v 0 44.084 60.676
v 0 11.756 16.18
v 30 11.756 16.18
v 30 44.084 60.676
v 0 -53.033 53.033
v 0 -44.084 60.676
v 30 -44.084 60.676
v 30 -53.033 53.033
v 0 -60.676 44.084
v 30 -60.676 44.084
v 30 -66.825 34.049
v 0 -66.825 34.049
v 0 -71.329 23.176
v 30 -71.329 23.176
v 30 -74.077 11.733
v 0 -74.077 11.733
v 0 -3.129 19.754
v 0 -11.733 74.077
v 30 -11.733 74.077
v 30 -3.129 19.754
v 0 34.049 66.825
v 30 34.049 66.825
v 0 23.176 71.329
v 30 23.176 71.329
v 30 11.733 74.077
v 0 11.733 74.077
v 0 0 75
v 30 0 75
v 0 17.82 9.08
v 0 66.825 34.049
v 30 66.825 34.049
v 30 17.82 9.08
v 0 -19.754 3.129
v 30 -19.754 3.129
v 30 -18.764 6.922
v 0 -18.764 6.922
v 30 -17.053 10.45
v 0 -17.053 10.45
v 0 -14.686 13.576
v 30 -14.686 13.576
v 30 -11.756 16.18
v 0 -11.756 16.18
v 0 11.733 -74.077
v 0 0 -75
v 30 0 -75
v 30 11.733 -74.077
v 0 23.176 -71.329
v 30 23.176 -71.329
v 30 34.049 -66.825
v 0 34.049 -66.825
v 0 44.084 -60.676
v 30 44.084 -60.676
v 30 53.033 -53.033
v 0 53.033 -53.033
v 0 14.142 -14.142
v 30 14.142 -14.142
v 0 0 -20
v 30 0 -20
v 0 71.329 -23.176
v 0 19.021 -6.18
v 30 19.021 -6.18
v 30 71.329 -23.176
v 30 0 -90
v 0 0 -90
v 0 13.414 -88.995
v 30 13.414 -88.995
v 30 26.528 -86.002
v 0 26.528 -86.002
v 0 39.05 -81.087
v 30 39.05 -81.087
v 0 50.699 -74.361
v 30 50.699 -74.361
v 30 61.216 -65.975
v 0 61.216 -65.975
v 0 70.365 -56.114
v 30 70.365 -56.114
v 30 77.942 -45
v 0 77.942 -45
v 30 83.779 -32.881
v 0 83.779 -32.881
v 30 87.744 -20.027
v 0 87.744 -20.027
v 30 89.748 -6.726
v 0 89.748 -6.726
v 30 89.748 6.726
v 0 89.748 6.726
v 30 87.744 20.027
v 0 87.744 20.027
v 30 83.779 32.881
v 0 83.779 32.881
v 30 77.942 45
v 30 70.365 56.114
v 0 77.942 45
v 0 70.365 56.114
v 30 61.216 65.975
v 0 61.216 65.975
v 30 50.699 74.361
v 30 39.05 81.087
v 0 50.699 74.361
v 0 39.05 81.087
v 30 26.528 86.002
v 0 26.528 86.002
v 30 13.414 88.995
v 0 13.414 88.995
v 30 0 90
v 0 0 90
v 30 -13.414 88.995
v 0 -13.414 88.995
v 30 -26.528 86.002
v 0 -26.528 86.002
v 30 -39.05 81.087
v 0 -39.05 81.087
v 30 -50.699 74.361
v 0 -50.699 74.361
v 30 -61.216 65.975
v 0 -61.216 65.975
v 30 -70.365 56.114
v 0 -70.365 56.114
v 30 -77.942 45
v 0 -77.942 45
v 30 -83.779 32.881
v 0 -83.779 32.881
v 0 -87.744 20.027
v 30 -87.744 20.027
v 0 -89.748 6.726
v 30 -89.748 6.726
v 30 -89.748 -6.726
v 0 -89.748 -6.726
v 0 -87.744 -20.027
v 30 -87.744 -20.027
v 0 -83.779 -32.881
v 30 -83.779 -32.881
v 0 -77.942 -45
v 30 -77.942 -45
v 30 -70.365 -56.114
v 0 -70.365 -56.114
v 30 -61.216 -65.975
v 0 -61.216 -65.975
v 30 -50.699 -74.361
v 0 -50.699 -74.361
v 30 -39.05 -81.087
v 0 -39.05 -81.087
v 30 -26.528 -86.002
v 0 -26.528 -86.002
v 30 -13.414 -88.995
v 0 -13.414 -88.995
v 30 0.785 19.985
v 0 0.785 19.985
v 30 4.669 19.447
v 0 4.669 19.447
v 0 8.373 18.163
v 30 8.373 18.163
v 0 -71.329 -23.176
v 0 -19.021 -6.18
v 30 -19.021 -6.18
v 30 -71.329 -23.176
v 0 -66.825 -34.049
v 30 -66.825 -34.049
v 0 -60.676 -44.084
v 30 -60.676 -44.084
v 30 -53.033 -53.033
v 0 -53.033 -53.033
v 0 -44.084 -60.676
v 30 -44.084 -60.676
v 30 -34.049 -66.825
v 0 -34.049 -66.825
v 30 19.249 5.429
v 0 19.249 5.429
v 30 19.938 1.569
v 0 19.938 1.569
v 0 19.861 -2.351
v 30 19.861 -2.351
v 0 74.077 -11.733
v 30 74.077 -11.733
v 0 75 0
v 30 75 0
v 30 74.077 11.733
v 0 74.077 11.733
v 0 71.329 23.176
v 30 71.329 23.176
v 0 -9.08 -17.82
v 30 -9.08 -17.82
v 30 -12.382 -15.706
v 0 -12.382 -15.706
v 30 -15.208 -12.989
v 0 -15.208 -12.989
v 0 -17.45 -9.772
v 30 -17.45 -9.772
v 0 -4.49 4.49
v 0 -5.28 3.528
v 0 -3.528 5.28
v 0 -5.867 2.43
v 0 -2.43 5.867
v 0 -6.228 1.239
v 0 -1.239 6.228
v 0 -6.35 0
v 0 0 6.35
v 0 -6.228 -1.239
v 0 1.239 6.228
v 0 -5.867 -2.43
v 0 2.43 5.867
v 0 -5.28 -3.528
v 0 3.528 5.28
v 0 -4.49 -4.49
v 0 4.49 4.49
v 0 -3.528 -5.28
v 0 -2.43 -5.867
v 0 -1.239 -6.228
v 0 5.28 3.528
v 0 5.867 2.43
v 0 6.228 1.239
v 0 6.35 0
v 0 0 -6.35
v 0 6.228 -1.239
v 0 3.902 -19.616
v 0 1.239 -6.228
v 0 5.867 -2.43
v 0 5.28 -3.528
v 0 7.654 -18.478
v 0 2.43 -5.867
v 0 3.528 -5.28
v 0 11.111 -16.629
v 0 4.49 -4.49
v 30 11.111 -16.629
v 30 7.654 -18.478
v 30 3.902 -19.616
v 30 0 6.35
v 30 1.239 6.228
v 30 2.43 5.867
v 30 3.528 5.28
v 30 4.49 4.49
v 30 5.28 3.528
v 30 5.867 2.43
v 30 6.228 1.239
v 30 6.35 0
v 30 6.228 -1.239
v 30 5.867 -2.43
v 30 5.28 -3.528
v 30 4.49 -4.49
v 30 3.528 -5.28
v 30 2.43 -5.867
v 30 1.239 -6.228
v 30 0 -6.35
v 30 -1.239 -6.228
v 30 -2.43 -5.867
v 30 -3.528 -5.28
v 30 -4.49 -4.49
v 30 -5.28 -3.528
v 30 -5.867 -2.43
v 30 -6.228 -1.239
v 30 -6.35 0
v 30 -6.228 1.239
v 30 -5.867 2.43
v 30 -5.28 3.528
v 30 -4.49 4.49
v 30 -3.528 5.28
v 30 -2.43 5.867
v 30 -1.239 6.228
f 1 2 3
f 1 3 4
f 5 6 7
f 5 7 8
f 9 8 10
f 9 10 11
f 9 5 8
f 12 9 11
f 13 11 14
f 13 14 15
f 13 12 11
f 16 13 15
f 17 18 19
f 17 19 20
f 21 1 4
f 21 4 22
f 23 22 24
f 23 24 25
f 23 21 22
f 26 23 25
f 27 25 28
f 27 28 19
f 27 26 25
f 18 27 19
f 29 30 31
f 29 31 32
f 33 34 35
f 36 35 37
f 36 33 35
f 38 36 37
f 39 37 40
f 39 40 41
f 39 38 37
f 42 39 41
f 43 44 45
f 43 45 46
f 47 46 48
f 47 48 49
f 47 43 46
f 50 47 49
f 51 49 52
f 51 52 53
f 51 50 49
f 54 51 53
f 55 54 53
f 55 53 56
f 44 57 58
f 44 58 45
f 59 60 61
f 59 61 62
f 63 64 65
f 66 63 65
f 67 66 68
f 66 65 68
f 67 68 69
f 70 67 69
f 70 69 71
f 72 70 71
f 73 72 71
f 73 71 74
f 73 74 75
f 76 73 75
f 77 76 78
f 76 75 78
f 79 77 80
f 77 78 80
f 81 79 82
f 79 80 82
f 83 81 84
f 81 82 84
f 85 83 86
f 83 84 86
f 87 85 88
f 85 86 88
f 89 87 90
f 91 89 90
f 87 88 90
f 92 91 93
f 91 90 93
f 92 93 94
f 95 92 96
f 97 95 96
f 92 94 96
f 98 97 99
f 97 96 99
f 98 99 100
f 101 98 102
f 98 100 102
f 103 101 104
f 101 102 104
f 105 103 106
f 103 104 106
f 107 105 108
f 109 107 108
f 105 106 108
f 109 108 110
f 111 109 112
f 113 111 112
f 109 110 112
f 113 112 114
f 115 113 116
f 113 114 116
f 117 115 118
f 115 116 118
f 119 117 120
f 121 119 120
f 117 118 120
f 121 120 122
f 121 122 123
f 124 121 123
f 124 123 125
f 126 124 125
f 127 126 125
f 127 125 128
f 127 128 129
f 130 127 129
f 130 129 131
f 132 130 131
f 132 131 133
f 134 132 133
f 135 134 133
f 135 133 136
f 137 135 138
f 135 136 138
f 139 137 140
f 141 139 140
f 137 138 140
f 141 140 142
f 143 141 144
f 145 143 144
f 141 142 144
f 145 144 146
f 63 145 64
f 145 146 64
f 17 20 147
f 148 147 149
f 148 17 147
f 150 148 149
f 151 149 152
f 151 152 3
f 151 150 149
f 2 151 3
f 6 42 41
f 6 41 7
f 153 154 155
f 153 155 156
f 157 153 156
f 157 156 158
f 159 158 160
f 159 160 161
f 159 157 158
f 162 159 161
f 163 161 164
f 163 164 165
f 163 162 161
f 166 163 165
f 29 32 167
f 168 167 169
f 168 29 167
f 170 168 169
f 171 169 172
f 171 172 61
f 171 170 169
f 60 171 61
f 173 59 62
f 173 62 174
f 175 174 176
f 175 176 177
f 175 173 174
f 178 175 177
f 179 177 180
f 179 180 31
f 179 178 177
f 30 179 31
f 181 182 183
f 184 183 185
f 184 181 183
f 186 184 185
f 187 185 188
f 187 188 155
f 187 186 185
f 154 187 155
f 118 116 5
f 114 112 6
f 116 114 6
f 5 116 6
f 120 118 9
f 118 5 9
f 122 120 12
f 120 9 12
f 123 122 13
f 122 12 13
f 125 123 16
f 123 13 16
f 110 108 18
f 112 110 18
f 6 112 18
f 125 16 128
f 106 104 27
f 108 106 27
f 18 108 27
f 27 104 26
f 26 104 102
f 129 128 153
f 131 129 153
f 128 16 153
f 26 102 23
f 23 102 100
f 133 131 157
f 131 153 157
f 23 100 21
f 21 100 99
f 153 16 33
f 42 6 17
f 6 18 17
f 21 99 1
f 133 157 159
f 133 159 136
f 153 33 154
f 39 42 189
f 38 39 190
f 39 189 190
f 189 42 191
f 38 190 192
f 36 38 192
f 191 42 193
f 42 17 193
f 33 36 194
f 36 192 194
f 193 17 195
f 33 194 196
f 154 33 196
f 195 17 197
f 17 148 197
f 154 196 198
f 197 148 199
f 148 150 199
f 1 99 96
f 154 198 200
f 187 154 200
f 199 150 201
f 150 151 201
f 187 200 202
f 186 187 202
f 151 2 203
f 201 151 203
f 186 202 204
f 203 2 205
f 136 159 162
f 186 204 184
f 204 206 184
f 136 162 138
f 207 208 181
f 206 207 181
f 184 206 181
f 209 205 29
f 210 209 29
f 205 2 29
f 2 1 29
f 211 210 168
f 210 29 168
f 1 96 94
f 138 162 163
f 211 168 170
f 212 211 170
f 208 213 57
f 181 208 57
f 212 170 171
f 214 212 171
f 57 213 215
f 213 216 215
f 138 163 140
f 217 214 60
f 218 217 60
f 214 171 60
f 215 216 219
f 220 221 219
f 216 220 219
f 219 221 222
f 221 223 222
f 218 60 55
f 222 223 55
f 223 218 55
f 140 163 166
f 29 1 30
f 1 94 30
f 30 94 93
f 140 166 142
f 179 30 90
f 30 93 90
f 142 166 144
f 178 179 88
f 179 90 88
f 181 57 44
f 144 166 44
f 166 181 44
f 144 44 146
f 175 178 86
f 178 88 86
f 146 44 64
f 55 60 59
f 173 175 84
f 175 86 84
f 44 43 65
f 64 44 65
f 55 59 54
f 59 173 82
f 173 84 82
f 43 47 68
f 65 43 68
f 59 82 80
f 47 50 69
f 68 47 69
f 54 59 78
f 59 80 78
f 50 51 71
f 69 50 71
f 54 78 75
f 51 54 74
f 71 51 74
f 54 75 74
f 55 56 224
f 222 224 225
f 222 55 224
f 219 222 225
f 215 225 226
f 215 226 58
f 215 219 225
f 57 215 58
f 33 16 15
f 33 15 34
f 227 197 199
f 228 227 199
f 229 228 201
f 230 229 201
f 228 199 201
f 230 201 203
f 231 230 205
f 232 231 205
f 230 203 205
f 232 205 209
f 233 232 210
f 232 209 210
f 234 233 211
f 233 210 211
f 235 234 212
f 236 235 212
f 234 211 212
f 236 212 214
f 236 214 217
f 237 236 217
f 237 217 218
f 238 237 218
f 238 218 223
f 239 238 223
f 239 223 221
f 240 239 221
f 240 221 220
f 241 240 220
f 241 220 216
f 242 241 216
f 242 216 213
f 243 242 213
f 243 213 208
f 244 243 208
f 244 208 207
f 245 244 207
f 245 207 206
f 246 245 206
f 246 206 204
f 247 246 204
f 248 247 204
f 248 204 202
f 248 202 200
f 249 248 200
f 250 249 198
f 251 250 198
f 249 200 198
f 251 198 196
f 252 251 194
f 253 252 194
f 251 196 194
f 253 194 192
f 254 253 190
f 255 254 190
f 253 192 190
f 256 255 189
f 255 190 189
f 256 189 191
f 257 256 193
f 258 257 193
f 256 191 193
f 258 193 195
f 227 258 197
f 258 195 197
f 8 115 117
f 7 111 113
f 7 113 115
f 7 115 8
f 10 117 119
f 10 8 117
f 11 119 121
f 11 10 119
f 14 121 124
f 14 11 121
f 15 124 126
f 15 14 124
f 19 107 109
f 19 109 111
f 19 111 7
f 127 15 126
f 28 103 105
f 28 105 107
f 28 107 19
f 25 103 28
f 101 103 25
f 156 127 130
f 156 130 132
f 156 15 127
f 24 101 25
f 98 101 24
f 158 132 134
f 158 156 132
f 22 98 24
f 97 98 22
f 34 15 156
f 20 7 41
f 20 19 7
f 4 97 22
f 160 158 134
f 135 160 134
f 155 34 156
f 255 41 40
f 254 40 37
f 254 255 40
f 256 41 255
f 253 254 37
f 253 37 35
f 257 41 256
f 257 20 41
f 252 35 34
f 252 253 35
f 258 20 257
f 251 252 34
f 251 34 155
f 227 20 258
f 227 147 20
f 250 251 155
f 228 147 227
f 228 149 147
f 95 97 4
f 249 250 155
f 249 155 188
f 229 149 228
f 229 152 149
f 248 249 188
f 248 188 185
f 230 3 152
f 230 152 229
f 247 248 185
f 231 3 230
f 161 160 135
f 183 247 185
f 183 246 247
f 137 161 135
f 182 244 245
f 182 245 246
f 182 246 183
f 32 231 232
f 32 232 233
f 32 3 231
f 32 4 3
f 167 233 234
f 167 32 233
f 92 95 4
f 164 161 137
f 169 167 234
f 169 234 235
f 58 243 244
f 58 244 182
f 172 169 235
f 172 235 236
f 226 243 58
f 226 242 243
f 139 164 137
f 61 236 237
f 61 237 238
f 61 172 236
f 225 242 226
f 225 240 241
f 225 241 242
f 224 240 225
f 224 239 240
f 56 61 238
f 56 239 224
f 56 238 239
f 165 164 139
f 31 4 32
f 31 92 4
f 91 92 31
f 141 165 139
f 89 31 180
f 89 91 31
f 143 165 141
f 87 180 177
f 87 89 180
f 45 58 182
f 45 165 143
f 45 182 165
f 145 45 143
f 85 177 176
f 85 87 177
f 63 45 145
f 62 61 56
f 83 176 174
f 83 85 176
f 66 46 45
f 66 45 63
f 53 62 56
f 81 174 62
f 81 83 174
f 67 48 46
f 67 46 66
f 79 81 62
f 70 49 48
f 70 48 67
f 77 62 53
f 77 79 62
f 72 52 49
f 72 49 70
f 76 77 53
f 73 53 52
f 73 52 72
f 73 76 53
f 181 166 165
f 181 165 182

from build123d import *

# Parameters (mm, degrees)
SKETCH1_R           = 90
BOSS_EXTRUDE1_DEPTH = 30
SKETCH2_R           = 6.35
CUT_EXTRUDE2_DEPTH  = 131.766968306
CUT_EXTRUDE3_DEPTH  = 30
CIRPATTERN1_COUNT   = 5


with BuildPart() as part:
    # Sketch1 → Boss-Extrude1 (new body)
    with BuildSketch(Plane(origin=(0, 0, 0), x_dir=(0, 0, -1), z_dir=(1, 0, 0))):
        Circle(SKETCH1_R)
    extrude(amount=BOSS_EXTRUDE1_DEPTH)

    # Sketch2 → Cut-Extrude2 (cut, through all)
    with BuildSketch(Plane.ZY):
        Circle(SKETCH2_R)
    extrude(amount=-CUT_EXTRUDE2_DEPTH, mode=Mode.SUBTRACT)

    # Sketch3 → Cut-Extrude3 (cut)
    with BuildSketch(Plane.ZY):
        with BuildLine():
            Line((-20, 0), (-75, 0))
            ThreePointArc((-75, 0), (-69.290964938, 28.701257427), (-53.033008589, 53.033008589))
            Line((-53.033008589, 53.033008589), (-14.142135624, 14.142135624))
            ThreePointArc((-14.142135624, 14.142135624), (-18.47759065, 7.653668647), (-20, 0))
        make_face()
    cut_extrude3 = extrude(amount=-CUT_EXTRUDE3_DEPTH, mode=Mode.SUBTRACT)

    # CirPattern1: Cut-Extrude3 ×5 about axis
    cirpattern1_axis = Axis((0, 0, 0), (1, 0, 0))
    for i in range(1, CIRPATTERN1_COUNT):
        add(cut_extrude3.rotate(cirpattern1_axis, i * 360 / CIRPATTERN1_COUNT), mode=Mode.SUBTRACT)


solid = part.part
